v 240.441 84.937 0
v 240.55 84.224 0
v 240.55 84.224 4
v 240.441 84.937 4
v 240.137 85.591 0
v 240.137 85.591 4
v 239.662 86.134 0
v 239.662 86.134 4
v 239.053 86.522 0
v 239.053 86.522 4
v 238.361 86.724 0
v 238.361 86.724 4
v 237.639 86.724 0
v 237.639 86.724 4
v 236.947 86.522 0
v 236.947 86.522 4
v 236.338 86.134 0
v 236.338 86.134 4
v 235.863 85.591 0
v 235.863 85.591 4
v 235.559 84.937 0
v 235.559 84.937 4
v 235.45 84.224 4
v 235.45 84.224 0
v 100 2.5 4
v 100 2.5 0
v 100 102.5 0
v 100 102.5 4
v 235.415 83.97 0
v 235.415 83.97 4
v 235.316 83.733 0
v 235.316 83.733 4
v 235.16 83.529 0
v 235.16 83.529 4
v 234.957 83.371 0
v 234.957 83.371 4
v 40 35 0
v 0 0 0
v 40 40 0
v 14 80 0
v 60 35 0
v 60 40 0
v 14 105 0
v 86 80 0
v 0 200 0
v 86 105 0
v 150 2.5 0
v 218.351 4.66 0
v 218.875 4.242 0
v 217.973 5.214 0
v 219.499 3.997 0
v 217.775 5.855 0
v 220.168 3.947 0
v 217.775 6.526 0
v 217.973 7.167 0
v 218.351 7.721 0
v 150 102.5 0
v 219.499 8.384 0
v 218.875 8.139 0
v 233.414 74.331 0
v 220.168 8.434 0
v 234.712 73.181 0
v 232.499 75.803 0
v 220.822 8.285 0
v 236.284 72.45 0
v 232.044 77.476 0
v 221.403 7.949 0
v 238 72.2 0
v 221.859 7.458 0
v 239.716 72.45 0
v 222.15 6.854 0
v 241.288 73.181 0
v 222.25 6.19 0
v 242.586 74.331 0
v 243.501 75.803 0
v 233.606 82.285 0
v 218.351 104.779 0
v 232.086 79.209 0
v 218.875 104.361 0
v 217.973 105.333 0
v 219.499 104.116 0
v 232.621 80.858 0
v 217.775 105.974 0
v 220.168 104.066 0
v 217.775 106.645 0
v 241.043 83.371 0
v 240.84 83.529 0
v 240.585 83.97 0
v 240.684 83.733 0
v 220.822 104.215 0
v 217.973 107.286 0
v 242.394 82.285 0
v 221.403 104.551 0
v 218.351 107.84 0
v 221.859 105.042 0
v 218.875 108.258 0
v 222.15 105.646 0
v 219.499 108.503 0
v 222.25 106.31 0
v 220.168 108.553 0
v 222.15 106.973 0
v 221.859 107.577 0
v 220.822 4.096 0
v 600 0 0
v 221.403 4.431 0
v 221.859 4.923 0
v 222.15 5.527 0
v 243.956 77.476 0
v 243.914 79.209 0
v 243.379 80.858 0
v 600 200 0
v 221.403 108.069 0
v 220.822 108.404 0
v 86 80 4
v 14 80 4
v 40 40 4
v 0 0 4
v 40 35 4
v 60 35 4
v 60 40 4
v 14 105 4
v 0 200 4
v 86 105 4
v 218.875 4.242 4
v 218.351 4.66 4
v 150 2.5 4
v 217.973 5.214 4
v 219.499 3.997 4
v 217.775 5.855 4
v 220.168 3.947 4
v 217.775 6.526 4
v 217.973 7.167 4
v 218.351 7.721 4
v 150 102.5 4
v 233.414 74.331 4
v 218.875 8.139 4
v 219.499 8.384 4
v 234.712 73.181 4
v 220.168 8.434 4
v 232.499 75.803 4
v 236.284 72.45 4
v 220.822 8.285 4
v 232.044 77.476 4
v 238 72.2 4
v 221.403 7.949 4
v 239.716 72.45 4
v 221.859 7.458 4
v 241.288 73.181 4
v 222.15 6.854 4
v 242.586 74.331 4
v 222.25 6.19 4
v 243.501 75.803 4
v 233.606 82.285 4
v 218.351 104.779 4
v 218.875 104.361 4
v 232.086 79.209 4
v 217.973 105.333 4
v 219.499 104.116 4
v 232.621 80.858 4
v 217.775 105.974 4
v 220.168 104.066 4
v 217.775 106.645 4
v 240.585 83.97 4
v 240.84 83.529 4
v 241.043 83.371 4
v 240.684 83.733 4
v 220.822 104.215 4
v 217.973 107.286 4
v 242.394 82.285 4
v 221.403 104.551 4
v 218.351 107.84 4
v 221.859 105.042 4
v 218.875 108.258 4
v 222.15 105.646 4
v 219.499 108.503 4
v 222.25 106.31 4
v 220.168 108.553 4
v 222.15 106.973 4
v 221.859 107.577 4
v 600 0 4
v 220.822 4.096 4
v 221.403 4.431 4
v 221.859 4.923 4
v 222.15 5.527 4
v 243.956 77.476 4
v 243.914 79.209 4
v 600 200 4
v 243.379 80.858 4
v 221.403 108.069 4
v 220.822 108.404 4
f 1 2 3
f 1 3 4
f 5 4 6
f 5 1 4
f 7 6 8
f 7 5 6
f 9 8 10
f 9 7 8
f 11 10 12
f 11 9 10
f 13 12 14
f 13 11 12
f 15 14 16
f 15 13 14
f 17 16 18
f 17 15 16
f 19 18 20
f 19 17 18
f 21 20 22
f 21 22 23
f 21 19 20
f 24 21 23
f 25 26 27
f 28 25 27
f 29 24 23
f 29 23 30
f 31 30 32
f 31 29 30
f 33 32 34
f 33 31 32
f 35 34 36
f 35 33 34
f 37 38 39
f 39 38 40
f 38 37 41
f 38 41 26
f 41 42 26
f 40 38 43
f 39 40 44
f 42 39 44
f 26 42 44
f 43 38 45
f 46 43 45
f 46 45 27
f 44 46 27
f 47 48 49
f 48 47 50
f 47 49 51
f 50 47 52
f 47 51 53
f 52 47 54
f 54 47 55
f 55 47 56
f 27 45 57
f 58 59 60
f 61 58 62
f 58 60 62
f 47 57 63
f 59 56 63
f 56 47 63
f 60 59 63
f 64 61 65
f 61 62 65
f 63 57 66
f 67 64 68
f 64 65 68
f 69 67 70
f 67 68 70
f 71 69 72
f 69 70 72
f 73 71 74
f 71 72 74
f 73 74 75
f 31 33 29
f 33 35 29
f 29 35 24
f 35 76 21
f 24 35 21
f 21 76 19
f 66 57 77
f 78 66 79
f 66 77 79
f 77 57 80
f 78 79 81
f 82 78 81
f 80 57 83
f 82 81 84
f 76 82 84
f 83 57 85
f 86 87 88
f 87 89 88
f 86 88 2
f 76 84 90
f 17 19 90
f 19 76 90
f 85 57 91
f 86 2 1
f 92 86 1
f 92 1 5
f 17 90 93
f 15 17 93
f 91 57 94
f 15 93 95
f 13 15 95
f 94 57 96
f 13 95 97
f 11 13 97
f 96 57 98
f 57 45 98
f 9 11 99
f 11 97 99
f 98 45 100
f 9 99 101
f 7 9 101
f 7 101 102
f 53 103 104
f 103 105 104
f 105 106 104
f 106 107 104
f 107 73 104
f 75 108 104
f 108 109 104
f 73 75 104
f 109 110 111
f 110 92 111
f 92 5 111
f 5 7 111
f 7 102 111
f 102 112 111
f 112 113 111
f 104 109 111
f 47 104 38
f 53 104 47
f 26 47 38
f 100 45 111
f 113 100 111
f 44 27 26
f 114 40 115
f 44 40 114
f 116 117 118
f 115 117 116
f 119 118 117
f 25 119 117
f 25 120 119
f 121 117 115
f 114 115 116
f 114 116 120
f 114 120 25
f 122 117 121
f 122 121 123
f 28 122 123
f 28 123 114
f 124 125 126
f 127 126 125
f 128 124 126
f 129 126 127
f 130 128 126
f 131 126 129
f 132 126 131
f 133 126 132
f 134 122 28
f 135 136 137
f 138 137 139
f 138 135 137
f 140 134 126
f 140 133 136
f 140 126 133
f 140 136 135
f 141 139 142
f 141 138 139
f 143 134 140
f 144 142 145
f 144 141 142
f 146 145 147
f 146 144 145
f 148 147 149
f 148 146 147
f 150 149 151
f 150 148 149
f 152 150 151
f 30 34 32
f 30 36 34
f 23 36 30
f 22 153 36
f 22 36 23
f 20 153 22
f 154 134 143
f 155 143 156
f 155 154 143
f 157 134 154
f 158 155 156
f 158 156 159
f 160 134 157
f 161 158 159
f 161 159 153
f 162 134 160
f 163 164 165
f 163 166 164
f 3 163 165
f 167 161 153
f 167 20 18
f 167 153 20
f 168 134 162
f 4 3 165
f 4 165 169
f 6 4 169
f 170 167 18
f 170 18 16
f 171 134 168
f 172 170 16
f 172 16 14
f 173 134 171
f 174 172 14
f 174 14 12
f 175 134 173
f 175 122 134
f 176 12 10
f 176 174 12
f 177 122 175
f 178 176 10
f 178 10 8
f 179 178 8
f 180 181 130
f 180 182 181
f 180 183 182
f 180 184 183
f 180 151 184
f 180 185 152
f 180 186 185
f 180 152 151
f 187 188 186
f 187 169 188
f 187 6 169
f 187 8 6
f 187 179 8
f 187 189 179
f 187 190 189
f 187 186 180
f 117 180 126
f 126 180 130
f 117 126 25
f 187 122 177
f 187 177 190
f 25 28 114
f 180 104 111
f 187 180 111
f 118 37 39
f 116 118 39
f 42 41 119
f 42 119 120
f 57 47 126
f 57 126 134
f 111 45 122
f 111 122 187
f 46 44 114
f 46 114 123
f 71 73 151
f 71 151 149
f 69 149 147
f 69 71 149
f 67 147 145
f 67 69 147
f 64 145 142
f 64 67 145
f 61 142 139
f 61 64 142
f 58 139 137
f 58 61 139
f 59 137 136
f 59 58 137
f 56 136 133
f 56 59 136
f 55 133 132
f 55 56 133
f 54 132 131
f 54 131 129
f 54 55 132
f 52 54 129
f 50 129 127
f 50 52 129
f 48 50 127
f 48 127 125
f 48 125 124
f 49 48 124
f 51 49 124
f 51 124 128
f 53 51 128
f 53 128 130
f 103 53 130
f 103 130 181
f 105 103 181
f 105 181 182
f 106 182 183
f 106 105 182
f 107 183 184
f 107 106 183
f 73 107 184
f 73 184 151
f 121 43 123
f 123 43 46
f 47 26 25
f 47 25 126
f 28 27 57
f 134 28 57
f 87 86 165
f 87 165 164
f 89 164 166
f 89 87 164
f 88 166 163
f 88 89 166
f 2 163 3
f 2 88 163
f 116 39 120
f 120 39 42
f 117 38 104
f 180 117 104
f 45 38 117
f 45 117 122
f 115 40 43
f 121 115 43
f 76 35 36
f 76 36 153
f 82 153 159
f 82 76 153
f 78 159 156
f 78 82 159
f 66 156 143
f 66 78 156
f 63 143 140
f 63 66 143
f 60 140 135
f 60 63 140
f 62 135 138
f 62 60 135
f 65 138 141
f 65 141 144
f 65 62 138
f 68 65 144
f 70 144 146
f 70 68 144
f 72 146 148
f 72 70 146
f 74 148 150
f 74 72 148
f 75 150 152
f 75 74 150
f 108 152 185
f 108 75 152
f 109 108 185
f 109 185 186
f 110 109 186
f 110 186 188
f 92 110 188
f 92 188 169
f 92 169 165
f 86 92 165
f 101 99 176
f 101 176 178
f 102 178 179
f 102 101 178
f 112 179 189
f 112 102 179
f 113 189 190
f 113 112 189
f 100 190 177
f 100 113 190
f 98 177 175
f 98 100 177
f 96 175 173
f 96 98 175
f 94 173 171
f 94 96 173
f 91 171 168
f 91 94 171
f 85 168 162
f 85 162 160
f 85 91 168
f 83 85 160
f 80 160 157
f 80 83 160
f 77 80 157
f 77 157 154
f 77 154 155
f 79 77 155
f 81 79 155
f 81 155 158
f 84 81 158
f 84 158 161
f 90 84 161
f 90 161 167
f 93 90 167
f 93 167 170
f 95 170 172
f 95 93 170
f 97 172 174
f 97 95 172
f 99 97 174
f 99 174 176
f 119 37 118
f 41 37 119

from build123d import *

# Parameters (mm, degrees)
SKETCH1_W           = 600
SKETCH1_H           = 200
SKETCH1_R           = 2.25
SKETCH1_W_2         = 50
SKETCH1_H_2         = 100
SKETCH1_W_3         = 20
SKETCH1_H_3         = 5
SKETCH1_W_4         = 72
SKETCH1_H_4         = 25
BOSS_EXTRUDE1_DEPTH = 4


with BuildPart() as part:
    # Sketch1 → Boss-Extrude1 (new body)
    with BuildSketch(Plane.XY):
        with Locations((300, 100)):
            Rectangle(SKETCH1_W, SKETCH1_H)
        with Locations((220, 106.30966113)):
            Circle(SKETCH1_R, mode=Mode.SUBTRACT)
        with Locations((220, 6.19033887)):
            Circle(SKETCH1_R, mode=Mode.SUBTRACT)
        with Locations((125, 52.5)):
            Rectangle(SKETCH1_W_2, SKETCH1_H_2, mode=Mode.SUBTRACT)
        with Locations((50, 37.5)):
            Rectangle(SKETCH1_W_3, SKETCH1_H_3, mode=Mode.SUBTRACT)
        with Locations((50, 92.5)):
            Rectangle(SKETCH1_W_4, SKETCH1_H_4, mode=Mode.SUBTRACT)
        with BuildLine():
            ThreePointArc((234.957275327, 83.37125), (238, 72.2), (241.042724673, 83.37125))
            ThreePointArc((241.042724673, 83.37125), (240.684092439, 83.732653501), (240.549888987, 84.223794014))
            ThreePointArc((240.549888987, 84.223794014), (238, 86.75), (235.450111013, 84.223794014))
            ThreePointArc((235.450111013, 84.223794014), (235.315907561, 83.732653501), (234.957275327, 83.37125))
        make_face(mode=Mode.SUBTRACT)
    extrude(amount=BOSS_EXTRUDE1_DEPTH)


solid = part.part
